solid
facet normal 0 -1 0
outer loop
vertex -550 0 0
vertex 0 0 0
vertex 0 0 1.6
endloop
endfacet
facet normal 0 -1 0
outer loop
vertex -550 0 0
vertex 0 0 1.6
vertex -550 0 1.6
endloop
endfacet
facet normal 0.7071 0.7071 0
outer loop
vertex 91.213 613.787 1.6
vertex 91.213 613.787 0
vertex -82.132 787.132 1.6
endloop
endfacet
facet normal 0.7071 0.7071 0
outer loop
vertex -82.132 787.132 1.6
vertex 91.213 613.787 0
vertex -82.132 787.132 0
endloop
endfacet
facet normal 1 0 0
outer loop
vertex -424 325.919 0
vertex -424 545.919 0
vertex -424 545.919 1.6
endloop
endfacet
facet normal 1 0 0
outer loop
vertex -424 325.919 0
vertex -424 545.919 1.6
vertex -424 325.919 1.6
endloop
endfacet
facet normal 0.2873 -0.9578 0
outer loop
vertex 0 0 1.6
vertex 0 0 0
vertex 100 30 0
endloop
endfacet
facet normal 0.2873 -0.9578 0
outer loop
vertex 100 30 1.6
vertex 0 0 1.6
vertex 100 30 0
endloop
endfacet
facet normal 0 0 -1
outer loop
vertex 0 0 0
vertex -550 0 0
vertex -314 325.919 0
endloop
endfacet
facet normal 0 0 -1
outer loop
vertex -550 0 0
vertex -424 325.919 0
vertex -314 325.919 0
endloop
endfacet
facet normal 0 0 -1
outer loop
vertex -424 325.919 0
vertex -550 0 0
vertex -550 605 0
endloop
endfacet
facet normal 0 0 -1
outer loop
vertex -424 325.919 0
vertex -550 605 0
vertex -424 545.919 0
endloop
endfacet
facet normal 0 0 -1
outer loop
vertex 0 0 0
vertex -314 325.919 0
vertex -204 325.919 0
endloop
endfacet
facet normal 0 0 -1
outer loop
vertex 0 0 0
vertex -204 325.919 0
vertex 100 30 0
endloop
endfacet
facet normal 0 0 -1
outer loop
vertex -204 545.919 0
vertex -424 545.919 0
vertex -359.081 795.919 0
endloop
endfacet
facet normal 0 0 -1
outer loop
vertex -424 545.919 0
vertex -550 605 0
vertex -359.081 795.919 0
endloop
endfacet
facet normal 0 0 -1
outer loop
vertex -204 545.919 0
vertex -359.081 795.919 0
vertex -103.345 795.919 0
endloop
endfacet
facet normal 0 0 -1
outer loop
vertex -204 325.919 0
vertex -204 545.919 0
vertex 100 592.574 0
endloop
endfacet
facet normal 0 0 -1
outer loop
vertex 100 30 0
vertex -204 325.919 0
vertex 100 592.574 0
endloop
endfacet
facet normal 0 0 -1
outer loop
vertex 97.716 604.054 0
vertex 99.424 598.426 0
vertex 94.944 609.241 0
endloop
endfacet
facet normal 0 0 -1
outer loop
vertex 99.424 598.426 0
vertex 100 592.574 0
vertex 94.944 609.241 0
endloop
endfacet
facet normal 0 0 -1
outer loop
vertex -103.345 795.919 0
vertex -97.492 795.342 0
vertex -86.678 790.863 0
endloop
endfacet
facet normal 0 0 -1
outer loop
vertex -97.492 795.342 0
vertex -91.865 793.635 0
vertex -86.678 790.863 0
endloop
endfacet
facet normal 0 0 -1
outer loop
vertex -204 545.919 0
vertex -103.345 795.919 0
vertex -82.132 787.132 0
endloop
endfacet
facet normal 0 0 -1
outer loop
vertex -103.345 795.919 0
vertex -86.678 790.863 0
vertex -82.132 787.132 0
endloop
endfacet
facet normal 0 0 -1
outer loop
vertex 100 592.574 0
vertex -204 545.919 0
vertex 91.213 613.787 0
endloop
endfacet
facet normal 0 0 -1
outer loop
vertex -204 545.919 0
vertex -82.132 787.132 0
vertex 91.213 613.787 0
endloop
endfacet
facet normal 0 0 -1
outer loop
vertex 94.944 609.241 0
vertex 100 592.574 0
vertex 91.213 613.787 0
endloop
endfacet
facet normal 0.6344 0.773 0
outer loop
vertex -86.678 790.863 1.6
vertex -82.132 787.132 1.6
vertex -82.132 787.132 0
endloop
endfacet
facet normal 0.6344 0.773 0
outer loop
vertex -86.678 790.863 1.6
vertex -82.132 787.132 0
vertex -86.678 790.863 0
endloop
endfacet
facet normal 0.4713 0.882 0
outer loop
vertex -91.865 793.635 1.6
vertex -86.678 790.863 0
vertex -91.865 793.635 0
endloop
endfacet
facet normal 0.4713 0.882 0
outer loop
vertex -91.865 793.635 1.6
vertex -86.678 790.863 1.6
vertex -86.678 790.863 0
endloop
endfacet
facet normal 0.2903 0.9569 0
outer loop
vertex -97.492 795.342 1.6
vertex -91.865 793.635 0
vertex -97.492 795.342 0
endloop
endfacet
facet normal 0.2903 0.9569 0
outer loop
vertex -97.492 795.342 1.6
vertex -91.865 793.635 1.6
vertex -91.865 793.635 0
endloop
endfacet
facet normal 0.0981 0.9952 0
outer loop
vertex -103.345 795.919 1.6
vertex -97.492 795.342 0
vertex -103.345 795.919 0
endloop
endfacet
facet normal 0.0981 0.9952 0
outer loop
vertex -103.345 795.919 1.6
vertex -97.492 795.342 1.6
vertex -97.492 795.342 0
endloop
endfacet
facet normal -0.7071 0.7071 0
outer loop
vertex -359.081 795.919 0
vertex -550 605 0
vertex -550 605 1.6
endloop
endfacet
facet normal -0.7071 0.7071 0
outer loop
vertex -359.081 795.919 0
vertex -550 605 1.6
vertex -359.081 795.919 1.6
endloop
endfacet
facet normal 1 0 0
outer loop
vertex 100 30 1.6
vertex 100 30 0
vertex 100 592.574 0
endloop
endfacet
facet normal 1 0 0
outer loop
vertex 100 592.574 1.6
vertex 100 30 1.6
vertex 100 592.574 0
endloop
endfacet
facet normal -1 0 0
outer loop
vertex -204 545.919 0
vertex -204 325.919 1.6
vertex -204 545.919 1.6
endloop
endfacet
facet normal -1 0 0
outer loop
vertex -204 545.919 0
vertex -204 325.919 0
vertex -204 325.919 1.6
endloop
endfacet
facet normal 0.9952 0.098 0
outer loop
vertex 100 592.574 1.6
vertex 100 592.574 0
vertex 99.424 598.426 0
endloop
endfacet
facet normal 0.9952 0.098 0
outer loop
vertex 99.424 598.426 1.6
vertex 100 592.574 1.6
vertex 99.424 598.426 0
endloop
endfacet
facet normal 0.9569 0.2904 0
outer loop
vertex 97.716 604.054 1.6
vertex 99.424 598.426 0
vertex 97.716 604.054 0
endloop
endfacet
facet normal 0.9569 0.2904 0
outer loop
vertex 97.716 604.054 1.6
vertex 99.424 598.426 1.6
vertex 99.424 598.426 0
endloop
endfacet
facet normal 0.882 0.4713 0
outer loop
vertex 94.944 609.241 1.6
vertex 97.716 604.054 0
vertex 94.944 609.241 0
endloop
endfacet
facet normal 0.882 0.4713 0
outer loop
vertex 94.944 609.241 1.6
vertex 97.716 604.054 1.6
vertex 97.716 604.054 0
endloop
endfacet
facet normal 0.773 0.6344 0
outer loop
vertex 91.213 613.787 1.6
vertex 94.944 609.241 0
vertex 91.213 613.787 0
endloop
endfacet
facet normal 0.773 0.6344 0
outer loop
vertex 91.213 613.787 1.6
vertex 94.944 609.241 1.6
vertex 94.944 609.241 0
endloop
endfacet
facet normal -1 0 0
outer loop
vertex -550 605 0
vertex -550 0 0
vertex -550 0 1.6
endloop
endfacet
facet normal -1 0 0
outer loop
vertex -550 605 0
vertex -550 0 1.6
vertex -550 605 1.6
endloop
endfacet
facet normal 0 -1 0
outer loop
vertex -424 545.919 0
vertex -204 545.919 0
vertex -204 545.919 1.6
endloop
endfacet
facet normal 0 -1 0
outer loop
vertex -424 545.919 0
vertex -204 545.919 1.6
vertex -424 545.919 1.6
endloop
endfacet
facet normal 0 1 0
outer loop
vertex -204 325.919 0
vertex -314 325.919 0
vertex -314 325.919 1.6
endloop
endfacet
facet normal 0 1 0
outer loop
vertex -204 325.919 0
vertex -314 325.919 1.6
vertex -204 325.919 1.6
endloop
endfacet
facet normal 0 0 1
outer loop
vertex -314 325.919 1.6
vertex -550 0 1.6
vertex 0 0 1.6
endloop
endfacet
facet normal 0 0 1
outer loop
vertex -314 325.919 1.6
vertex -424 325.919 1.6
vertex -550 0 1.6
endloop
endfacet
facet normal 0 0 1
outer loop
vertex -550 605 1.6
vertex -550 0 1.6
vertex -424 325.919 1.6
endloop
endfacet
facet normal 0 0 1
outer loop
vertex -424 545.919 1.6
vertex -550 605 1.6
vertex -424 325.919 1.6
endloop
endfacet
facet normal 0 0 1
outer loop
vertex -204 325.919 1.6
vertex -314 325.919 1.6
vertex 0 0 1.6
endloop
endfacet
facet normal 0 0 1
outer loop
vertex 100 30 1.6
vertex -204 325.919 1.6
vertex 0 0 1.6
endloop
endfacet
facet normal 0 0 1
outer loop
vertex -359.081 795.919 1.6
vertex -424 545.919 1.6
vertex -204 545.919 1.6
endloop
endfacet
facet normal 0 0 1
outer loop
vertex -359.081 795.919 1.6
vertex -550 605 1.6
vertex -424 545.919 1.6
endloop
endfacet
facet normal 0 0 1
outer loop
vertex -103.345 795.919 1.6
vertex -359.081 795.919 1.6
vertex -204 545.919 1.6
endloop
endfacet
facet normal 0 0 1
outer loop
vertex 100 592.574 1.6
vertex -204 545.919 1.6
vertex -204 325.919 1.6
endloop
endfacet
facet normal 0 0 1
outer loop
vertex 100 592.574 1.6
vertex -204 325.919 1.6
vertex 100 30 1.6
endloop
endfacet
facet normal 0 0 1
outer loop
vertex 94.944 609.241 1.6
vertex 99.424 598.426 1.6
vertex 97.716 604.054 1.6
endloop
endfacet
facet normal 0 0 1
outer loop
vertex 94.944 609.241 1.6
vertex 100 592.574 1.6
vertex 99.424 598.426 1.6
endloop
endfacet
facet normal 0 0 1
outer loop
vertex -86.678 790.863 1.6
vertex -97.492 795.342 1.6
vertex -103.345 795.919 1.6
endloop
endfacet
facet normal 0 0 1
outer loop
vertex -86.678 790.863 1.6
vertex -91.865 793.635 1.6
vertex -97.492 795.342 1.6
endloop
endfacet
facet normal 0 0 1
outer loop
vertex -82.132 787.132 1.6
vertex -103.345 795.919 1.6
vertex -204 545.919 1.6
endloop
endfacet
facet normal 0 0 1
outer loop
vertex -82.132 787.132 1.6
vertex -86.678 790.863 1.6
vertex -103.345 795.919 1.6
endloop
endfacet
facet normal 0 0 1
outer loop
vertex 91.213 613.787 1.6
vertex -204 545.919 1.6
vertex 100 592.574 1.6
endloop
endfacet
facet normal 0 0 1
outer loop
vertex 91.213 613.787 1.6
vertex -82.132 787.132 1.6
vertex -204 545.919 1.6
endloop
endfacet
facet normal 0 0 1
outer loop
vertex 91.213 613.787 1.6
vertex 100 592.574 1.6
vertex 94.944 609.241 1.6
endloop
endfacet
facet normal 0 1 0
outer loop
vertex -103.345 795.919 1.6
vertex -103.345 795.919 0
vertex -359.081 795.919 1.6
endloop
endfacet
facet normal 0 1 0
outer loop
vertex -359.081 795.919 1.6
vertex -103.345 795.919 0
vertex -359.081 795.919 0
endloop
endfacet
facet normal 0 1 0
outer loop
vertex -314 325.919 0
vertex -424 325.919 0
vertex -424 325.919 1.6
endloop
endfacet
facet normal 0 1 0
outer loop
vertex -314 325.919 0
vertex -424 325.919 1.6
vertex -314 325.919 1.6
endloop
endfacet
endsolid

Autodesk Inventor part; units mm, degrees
ref_plane "YZ Plane" through (0, 0, 0) normal (1, 0, 0) x (0, 1, 0)
ref_plane "XZ Plane" through (0, 0, 0) normal (0, 1, 0) x (-1, 0, 0)
ref_plane "XY Plane" through (0, 0, 0) normal (0, 0, 1) x (1, 0, 0)
sketch "Sketch1" plane through (0, 0, 0) normal (0, 0, 1) x (1, 0, 0)
  line L0 (-314, 325.9188) -> (-204, 325.9188)
  line L1 (-204, 325.9188) -> (-204, 545.9188)
  line L2 (-204, 545.9188) -> (-424, 545.9188)
  line L3 (-424, 545.9188) -> (-424, 325.9188)
  line L4 (-424, 325.9188) -> (-314, 325.9188)
  line L5 (0, 0) -> (100, 30)
  line L6 (0, 0) -> (272.914, 0) construction
  line L7 (100, 30) -> (100, 605)
  line L8 (0, 0) -> (-550, 0)
  line L9 (-550, 0) -> (-550, 605)
  line L10 (100, 605) -> (-90.9188, 795.9188)
  line L11 (100, 605) -> (370, 605) construction
  line L12 (-90.9188, 795.9188) -> (-359.0812, 795.9188)
  line L13 (-550, 605) -> (-359.0812, 795.9188)
  line L14 (-550, 605) -> (-280, 605) construction
  dimension "d10" = 110
  dimension "d11" = 220
  dimension "d12" = 220
  dimension "d21" = 100
  dimension "d24" = 550
  dimension "d25" = 126
  dimension "d29" = 30
  dimension "d30" = 270
  dimension "d31" = 135
  dimension "d32" = 270
  dimension "d33" = 45
  dimension "d34" = 605
  dimension "d35" = 250
extrude "Extrusion1" add sketch "Sketch1" along normal blind 1.6
fillet "Fillet2" radius 30 2 edges at (100, 605, 0.8) (-90.9188, 795.9188, 0.8)
equation "\"BendRadius\" = Thickness"
equation "\"BendReliefWidth\" = Thickness"
equation "\"BendReliefDepth\" = 0.5 * Thickness"
equation "\"CornerReliefSize\" = 4 * Thickness"
equation "\"MinimumRemnant\" = 2 * Thickness"
equation "\"TransitionRadius\" = BendRadius"
equation "\"JacobiRadiusSize\" = Thickness"
equation "\"GapSize\" = Thickness"
equation "\"Thickness\" = 0.5"
properties part number "side plate" material "Steel"
